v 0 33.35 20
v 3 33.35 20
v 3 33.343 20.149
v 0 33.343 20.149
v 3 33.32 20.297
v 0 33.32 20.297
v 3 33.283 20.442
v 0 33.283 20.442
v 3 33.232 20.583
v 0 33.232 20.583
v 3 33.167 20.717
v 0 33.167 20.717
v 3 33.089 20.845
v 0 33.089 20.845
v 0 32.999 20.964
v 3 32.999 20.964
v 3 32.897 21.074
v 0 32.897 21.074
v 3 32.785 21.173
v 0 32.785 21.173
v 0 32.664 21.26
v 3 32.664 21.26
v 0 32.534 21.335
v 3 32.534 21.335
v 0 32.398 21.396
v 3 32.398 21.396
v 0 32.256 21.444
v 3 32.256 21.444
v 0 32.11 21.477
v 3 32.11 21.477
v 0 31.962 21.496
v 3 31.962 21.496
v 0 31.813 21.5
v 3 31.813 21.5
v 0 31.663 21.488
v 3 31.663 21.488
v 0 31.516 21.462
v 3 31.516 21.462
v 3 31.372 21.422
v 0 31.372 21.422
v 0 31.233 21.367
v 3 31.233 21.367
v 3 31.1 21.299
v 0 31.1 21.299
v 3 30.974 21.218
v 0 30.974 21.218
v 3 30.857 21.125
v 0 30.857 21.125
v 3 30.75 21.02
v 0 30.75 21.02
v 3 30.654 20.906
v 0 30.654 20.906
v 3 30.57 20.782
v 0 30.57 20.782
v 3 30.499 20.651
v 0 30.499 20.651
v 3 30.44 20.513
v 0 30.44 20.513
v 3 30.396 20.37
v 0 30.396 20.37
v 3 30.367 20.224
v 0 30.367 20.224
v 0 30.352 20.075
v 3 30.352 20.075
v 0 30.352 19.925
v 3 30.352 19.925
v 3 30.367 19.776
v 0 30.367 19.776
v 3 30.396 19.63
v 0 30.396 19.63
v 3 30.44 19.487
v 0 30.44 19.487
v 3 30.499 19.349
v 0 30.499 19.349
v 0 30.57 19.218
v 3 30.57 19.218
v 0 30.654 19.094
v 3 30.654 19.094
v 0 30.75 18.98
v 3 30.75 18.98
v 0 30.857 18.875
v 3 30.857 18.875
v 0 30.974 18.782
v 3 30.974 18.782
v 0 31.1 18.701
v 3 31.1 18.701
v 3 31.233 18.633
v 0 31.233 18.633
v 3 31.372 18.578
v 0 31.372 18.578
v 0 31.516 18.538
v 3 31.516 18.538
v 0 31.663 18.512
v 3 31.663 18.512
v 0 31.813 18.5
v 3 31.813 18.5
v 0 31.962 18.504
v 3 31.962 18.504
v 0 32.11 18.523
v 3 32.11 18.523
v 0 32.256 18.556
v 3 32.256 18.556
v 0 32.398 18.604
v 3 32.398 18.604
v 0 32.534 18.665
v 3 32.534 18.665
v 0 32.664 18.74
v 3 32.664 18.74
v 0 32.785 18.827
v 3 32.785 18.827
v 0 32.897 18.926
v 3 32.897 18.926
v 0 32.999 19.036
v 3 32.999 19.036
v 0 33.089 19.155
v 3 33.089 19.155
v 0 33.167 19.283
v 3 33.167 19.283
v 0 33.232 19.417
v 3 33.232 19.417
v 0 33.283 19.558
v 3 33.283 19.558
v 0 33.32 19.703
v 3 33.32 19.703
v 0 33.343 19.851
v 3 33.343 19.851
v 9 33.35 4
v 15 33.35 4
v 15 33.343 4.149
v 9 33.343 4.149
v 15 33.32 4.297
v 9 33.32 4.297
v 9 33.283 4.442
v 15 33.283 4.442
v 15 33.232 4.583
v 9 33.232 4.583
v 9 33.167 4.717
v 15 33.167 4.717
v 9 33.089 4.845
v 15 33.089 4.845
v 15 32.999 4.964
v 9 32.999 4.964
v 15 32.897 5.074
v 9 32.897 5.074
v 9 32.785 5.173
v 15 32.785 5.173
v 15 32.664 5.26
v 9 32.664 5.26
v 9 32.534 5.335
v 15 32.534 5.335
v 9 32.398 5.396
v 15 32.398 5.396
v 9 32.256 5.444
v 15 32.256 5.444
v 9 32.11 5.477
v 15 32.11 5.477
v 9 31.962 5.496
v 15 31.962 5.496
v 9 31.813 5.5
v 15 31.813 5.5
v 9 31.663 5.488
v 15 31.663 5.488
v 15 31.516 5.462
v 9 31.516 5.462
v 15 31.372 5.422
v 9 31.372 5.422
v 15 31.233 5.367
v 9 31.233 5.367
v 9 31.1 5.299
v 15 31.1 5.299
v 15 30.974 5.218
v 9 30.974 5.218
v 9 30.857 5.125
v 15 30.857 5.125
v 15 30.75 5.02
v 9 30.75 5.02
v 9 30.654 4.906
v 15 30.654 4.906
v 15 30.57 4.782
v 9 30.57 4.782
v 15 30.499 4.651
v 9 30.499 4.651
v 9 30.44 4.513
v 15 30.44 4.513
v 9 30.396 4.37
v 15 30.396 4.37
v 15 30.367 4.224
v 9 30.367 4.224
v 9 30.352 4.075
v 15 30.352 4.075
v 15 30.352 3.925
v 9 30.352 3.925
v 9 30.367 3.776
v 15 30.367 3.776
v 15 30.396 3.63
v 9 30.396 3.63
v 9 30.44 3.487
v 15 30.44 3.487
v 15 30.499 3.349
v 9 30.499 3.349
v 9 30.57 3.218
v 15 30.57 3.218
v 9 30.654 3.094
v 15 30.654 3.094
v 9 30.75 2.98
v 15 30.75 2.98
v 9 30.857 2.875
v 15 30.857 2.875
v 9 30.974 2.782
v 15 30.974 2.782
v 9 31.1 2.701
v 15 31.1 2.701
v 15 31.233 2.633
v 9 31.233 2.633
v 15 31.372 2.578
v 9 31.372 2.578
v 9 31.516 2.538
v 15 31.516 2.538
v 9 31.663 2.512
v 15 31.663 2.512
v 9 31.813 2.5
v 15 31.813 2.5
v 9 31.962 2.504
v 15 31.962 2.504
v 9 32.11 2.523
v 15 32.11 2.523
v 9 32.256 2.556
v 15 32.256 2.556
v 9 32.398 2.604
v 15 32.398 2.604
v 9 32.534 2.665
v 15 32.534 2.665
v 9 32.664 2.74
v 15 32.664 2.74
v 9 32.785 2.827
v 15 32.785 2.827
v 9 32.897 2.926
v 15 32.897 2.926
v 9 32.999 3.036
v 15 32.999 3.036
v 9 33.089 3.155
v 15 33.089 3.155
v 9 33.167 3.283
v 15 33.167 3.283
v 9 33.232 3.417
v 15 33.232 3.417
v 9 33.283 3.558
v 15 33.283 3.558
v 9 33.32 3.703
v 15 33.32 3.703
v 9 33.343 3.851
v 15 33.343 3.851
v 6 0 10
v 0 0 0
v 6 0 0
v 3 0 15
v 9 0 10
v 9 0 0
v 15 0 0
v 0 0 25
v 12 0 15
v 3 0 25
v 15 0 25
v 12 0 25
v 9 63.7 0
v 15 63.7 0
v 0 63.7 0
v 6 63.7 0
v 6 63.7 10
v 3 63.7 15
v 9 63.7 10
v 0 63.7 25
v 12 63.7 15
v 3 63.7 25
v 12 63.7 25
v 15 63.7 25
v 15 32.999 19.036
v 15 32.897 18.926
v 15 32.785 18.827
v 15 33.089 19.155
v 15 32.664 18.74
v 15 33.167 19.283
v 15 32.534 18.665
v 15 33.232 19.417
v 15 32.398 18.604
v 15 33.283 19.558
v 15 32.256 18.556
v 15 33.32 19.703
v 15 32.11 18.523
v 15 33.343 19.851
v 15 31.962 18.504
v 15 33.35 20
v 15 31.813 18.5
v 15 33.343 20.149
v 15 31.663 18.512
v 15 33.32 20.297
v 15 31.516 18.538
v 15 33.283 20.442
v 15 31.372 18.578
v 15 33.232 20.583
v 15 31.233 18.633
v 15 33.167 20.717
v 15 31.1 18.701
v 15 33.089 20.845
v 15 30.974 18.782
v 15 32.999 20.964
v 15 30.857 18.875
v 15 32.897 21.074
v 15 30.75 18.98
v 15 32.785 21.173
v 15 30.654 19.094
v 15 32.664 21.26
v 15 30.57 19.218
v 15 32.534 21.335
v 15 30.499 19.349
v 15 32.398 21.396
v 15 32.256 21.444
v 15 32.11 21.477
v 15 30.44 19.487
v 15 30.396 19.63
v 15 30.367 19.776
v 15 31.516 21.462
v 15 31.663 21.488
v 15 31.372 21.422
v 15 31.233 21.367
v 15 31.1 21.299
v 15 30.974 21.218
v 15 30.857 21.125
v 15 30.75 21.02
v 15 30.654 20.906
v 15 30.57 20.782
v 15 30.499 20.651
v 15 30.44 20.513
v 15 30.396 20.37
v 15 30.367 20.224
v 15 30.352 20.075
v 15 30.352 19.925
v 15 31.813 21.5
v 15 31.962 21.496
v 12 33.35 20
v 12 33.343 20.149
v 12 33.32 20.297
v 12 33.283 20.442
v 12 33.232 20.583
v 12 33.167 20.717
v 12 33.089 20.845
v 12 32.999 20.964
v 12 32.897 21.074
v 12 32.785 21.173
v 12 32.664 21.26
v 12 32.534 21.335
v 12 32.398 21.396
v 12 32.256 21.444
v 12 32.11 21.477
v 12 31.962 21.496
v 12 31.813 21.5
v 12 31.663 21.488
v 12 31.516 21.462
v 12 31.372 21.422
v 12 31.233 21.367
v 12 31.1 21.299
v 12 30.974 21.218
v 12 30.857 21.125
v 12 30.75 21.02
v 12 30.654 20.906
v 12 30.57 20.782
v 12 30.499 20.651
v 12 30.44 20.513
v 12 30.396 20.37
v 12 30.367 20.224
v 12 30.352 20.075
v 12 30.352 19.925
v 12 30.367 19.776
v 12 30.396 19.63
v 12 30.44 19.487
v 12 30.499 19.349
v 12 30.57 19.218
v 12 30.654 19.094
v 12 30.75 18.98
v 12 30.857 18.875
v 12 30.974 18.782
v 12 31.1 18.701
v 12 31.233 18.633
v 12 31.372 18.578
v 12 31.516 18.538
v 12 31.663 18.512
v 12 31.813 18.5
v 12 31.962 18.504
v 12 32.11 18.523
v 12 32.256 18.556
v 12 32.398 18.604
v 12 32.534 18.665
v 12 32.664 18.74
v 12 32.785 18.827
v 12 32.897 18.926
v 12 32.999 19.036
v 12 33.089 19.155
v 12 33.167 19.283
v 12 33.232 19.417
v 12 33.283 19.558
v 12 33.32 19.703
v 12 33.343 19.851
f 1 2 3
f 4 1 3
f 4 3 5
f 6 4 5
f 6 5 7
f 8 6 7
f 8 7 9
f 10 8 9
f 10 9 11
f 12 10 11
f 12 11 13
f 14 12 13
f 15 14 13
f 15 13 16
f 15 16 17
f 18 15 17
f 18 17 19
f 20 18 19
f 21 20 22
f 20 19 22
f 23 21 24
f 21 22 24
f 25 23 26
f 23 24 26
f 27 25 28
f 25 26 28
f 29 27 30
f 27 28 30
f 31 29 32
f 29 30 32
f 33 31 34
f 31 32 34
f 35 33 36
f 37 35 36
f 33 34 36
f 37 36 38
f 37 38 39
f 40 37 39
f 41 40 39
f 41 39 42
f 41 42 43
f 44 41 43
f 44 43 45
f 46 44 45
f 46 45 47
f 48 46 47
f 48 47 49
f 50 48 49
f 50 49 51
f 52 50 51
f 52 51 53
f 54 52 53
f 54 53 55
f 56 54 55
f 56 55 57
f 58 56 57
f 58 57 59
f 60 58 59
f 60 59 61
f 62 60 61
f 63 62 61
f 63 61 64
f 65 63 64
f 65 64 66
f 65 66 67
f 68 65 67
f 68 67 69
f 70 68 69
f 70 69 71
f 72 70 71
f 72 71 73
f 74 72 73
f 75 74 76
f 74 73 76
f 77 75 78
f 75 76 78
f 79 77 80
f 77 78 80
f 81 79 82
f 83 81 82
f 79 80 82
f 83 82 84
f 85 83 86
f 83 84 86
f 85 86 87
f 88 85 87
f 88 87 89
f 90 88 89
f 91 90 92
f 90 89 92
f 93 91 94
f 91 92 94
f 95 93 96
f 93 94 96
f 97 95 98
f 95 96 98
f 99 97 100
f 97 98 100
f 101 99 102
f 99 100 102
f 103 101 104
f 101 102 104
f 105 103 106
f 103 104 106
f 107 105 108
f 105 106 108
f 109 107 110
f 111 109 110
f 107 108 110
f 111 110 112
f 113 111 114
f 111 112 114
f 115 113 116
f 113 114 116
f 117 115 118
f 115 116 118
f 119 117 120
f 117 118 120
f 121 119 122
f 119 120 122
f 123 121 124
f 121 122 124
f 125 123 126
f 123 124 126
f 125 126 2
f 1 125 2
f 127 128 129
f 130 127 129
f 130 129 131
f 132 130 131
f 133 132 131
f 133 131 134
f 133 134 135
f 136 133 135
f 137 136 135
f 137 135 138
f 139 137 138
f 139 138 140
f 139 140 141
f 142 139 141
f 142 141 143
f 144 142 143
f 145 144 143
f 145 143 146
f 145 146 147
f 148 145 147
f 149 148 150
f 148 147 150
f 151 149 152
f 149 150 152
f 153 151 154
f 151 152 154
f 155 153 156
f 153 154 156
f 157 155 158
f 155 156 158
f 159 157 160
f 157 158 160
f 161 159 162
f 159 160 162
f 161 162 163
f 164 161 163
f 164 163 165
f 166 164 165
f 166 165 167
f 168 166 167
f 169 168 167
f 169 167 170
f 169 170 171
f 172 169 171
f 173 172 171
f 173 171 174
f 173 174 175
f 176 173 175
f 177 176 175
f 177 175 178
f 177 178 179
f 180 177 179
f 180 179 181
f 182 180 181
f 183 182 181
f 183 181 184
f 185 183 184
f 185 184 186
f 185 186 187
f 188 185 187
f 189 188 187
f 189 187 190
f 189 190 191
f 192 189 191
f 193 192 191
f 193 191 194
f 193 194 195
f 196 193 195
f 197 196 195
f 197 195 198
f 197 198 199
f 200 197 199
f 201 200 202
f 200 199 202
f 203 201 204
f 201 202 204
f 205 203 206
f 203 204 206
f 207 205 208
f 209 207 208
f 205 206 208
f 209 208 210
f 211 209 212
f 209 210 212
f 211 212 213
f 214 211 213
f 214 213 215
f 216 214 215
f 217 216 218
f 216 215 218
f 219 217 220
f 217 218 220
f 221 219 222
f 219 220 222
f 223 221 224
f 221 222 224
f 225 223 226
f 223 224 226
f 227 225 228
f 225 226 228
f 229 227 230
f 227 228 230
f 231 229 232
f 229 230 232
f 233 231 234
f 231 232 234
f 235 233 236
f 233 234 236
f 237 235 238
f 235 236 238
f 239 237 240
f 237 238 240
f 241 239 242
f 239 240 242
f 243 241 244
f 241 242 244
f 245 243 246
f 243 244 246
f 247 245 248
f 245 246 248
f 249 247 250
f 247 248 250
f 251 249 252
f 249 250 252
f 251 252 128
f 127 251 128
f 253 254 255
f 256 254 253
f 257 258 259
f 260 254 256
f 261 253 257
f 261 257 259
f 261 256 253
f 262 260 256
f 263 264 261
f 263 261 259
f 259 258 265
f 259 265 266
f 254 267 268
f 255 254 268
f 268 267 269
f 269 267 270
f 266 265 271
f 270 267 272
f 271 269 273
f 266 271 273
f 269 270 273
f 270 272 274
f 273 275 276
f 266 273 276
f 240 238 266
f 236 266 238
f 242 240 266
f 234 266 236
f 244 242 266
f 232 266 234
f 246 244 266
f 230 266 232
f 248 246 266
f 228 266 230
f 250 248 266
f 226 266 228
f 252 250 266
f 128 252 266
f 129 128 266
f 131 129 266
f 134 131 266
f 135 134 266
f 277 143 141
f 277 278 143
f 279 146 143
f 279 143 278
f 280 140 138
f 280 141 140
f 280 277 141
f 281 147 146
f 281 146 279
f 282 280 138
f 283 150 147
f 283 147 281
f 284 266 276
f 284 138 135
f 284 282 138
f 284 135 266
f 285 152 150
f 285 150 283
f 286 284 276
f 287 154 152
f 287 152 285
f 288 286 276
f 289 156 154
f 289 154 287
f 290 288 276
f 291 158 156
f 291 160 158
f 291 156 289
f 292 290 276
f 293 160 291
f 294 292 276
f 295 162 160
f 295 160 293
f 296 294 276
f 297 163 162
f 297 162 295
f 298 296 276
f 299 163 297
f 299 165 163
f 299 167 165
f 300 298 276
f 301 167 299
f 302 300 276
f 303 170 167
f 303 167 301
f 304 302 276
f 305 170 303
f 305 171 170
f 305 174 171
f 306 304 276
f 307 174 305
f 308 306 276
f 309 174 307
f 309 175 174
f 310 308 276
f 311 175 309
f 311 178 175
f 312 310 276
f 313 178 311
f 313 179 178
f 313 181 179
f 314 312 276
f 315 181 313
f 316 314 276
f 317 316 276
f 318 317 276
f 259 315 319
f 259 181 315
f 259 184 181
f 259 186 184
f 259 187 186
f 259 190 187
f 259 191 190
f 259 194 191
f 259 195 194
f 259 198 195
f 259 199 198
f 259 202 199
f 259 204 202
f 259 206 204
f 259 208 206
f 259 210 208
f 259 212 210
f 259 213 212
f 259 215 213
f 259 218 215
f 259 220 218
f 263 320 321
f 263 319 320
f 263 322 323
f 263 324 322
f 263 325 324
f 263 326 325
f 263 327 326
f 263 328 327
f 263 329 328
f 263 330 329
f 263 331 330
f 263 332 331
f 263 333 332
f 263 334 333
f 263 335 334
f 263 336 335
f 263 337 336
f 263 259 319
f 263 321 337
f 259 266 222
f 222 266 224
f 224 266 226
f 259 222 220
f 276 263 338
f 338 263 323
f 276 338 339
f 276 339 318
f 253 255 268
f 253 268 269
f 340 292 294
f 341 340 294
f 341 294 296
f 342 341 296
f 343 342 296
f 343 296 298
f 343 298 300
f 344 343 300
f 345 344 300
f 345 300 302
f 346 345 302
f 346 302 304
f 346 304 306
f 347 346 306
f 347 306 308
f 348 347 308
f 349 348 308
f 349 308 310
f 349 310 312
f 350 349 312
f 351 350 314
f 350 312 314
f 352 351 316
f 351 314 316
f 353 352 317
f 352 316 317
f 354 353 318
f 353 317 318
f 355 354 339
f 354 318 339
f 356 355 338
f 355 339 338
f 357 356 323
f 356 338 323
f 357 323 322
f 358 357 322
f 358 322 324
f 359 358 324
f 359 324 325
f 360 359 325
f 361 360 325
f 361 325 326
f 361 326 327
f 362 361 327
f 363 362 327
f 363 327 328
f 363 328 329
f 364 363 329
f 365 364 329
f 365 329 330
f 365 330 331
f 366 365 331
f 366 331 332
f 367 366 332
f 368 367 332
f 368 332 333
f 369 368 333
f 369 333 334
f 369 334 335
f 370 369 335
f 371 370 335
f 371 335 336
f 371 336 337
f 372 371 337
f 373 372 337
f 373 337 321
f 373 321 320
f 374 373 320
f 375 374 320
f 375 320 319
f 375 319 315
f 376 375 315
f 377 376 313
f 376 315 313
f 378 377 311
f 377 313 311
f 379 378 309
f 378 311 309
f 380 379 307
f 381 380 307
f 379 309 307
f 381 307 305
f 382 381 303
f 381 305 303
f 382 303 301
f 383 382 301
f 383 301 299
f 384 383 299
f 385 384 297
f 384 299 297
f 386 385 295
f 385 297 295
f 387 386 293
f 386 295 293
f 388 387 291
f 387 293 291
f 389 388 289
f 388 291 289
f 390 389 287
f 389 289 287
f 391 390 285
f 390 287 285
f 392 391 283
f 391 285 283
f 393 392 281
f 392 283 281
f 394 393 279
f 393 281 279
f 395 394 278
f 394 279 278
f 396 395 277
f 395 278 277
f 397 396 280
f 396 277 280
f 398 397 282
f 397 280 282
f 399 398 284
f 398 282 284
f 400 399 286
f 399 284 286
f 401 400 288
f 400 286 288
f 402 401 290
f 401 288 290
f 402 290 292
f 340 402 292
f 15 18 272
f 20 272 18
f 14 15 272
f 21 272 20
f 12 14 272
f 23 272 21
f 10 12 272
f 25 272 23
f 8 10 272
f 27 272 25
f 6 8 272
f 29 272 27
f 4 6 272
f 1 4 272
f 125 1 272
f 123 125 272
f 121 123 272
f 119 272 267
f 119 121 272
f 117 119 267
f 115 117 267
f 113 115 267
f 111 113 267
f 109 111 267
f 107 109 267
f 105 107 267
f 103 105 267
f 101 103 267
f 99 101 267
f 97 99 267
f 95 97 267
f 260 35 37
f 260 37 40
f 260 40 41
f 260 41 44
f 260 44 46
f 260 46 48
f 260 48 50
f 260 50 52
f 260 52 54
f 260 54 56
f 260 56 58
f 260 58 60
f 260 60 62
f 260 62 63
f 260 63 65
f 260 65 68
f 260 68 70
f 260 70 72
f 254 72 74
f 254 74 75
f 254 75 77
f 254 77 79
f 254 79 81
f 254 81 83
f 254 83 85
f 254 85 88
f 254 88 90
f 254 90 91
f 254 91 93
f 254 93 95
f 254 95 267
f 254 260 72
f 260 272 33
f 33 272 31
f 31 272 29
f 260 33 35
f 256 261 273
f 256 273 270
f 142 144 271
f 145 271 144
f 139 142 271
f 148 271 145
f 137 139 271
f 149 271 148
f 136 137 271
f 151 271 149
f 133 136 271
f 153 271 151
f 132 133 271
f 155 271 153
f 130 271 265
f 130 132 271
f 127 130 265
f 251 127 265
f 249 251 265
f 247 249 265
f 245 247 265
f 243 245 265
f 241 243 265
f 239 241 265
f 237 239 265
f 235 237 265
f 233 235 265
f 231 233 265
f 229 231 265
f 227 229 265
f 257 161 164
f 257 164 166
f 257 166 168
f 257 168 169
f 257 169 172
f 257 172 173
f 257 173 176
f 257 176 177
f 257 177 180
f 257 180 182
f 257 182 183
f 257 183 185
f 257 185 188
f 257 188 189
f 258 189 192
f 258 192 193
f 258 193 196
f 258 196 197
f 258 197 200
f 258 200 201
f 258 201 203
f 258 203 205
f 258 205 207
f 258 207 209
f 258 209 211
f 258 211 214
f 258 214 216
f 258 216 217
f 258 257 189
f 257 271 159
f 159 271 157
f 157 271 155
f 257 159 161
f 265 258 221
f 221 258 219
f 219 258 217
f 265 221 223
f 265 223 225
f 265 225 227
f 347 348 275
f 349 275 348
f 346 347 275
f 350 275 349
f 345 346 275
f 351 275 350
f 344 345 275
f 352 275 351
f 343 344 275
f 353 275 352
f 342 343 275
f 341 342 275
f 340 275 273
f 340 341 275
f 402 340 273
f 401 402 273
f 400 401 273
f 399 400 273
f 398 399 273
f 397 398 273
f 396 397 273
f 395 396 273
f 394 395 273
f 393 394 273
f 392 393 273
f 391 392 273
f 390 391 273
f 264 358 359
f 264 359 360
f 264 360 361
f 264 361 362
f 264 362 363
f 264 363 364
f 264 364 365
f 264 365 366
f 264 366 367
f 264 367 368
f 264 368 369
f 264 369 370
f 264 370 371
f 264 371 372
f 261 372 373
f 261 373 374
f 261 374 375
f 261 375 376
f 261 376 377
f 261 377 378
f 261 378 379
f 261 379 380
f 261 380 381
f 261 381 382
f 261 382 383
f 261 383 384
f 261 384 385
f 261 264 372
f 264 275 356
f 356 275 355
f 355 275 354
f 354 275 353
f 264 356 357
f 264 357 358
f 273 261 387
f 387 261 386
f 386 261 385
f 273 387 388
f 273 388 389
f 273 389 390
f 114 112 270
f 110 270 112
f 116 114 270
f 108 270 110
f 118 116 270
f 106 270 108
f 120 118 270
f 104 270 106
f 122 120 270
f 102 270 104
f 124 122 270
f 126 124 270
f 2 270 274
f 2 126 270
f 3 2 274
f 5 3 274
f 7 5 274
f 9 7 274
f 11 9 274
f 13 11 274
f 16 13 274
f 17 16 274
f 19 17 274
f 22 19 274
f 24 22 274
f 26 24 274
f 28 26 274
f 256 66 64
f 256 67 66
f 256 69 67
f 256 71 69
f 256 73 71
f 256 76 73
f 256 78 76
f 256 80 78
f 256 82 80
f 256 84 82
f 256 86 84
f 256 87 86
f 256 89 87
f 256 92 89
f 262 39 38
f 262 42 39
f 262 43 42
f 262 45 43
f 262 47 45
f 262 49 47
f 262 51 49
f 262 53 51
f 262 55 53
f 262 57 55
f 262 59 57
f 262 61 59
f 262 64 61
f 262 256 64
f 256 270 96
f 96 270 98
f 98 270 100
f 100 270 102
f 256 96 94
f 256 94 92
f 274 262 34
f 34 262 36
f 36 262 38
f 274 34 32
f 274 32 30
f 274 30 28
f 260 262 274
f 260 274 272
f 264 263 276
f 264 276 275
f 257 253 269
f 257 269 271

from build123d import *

# Parameters (mm, degrees)
F1_DEPTH = 63.7
F2_R     = 1.5
F3_DEPTH = 25
F4_DEPTH = 8


with BuildPart() as f1:
    # F0 (on Front) → F1 (new body)
    with BuildSketch(Plane.XZ):
        Polygon((0, 25), (0, 0), (6, 0), (6, 10), (9, 10), (9, 0), (15, 0), (15, 25), (12, 25), (12, 15), (3, 15), (3, 25), align=None)
    extrude(amount=-F1_DEPTH)

    # F2 (on face) → F3 (cut)
    with BuildSketch(Plane.YZ.offset(15)):
        with Locations((31.85, 20)):
            Circle(F2_R)
    extrude(amount=-F3_DEPTH, mode=Mode.SUBTRACT)

    # F2 (on face) → F4 (cut)
    with BuildSketch(Plane.YZ.offset(15)):
        with Locations((31.85, 4)):
            Circle(F2_R)
    extrude(amount=-F4_DEPTH, mode=Mode.SUBTRACT)


solid = f1.part
